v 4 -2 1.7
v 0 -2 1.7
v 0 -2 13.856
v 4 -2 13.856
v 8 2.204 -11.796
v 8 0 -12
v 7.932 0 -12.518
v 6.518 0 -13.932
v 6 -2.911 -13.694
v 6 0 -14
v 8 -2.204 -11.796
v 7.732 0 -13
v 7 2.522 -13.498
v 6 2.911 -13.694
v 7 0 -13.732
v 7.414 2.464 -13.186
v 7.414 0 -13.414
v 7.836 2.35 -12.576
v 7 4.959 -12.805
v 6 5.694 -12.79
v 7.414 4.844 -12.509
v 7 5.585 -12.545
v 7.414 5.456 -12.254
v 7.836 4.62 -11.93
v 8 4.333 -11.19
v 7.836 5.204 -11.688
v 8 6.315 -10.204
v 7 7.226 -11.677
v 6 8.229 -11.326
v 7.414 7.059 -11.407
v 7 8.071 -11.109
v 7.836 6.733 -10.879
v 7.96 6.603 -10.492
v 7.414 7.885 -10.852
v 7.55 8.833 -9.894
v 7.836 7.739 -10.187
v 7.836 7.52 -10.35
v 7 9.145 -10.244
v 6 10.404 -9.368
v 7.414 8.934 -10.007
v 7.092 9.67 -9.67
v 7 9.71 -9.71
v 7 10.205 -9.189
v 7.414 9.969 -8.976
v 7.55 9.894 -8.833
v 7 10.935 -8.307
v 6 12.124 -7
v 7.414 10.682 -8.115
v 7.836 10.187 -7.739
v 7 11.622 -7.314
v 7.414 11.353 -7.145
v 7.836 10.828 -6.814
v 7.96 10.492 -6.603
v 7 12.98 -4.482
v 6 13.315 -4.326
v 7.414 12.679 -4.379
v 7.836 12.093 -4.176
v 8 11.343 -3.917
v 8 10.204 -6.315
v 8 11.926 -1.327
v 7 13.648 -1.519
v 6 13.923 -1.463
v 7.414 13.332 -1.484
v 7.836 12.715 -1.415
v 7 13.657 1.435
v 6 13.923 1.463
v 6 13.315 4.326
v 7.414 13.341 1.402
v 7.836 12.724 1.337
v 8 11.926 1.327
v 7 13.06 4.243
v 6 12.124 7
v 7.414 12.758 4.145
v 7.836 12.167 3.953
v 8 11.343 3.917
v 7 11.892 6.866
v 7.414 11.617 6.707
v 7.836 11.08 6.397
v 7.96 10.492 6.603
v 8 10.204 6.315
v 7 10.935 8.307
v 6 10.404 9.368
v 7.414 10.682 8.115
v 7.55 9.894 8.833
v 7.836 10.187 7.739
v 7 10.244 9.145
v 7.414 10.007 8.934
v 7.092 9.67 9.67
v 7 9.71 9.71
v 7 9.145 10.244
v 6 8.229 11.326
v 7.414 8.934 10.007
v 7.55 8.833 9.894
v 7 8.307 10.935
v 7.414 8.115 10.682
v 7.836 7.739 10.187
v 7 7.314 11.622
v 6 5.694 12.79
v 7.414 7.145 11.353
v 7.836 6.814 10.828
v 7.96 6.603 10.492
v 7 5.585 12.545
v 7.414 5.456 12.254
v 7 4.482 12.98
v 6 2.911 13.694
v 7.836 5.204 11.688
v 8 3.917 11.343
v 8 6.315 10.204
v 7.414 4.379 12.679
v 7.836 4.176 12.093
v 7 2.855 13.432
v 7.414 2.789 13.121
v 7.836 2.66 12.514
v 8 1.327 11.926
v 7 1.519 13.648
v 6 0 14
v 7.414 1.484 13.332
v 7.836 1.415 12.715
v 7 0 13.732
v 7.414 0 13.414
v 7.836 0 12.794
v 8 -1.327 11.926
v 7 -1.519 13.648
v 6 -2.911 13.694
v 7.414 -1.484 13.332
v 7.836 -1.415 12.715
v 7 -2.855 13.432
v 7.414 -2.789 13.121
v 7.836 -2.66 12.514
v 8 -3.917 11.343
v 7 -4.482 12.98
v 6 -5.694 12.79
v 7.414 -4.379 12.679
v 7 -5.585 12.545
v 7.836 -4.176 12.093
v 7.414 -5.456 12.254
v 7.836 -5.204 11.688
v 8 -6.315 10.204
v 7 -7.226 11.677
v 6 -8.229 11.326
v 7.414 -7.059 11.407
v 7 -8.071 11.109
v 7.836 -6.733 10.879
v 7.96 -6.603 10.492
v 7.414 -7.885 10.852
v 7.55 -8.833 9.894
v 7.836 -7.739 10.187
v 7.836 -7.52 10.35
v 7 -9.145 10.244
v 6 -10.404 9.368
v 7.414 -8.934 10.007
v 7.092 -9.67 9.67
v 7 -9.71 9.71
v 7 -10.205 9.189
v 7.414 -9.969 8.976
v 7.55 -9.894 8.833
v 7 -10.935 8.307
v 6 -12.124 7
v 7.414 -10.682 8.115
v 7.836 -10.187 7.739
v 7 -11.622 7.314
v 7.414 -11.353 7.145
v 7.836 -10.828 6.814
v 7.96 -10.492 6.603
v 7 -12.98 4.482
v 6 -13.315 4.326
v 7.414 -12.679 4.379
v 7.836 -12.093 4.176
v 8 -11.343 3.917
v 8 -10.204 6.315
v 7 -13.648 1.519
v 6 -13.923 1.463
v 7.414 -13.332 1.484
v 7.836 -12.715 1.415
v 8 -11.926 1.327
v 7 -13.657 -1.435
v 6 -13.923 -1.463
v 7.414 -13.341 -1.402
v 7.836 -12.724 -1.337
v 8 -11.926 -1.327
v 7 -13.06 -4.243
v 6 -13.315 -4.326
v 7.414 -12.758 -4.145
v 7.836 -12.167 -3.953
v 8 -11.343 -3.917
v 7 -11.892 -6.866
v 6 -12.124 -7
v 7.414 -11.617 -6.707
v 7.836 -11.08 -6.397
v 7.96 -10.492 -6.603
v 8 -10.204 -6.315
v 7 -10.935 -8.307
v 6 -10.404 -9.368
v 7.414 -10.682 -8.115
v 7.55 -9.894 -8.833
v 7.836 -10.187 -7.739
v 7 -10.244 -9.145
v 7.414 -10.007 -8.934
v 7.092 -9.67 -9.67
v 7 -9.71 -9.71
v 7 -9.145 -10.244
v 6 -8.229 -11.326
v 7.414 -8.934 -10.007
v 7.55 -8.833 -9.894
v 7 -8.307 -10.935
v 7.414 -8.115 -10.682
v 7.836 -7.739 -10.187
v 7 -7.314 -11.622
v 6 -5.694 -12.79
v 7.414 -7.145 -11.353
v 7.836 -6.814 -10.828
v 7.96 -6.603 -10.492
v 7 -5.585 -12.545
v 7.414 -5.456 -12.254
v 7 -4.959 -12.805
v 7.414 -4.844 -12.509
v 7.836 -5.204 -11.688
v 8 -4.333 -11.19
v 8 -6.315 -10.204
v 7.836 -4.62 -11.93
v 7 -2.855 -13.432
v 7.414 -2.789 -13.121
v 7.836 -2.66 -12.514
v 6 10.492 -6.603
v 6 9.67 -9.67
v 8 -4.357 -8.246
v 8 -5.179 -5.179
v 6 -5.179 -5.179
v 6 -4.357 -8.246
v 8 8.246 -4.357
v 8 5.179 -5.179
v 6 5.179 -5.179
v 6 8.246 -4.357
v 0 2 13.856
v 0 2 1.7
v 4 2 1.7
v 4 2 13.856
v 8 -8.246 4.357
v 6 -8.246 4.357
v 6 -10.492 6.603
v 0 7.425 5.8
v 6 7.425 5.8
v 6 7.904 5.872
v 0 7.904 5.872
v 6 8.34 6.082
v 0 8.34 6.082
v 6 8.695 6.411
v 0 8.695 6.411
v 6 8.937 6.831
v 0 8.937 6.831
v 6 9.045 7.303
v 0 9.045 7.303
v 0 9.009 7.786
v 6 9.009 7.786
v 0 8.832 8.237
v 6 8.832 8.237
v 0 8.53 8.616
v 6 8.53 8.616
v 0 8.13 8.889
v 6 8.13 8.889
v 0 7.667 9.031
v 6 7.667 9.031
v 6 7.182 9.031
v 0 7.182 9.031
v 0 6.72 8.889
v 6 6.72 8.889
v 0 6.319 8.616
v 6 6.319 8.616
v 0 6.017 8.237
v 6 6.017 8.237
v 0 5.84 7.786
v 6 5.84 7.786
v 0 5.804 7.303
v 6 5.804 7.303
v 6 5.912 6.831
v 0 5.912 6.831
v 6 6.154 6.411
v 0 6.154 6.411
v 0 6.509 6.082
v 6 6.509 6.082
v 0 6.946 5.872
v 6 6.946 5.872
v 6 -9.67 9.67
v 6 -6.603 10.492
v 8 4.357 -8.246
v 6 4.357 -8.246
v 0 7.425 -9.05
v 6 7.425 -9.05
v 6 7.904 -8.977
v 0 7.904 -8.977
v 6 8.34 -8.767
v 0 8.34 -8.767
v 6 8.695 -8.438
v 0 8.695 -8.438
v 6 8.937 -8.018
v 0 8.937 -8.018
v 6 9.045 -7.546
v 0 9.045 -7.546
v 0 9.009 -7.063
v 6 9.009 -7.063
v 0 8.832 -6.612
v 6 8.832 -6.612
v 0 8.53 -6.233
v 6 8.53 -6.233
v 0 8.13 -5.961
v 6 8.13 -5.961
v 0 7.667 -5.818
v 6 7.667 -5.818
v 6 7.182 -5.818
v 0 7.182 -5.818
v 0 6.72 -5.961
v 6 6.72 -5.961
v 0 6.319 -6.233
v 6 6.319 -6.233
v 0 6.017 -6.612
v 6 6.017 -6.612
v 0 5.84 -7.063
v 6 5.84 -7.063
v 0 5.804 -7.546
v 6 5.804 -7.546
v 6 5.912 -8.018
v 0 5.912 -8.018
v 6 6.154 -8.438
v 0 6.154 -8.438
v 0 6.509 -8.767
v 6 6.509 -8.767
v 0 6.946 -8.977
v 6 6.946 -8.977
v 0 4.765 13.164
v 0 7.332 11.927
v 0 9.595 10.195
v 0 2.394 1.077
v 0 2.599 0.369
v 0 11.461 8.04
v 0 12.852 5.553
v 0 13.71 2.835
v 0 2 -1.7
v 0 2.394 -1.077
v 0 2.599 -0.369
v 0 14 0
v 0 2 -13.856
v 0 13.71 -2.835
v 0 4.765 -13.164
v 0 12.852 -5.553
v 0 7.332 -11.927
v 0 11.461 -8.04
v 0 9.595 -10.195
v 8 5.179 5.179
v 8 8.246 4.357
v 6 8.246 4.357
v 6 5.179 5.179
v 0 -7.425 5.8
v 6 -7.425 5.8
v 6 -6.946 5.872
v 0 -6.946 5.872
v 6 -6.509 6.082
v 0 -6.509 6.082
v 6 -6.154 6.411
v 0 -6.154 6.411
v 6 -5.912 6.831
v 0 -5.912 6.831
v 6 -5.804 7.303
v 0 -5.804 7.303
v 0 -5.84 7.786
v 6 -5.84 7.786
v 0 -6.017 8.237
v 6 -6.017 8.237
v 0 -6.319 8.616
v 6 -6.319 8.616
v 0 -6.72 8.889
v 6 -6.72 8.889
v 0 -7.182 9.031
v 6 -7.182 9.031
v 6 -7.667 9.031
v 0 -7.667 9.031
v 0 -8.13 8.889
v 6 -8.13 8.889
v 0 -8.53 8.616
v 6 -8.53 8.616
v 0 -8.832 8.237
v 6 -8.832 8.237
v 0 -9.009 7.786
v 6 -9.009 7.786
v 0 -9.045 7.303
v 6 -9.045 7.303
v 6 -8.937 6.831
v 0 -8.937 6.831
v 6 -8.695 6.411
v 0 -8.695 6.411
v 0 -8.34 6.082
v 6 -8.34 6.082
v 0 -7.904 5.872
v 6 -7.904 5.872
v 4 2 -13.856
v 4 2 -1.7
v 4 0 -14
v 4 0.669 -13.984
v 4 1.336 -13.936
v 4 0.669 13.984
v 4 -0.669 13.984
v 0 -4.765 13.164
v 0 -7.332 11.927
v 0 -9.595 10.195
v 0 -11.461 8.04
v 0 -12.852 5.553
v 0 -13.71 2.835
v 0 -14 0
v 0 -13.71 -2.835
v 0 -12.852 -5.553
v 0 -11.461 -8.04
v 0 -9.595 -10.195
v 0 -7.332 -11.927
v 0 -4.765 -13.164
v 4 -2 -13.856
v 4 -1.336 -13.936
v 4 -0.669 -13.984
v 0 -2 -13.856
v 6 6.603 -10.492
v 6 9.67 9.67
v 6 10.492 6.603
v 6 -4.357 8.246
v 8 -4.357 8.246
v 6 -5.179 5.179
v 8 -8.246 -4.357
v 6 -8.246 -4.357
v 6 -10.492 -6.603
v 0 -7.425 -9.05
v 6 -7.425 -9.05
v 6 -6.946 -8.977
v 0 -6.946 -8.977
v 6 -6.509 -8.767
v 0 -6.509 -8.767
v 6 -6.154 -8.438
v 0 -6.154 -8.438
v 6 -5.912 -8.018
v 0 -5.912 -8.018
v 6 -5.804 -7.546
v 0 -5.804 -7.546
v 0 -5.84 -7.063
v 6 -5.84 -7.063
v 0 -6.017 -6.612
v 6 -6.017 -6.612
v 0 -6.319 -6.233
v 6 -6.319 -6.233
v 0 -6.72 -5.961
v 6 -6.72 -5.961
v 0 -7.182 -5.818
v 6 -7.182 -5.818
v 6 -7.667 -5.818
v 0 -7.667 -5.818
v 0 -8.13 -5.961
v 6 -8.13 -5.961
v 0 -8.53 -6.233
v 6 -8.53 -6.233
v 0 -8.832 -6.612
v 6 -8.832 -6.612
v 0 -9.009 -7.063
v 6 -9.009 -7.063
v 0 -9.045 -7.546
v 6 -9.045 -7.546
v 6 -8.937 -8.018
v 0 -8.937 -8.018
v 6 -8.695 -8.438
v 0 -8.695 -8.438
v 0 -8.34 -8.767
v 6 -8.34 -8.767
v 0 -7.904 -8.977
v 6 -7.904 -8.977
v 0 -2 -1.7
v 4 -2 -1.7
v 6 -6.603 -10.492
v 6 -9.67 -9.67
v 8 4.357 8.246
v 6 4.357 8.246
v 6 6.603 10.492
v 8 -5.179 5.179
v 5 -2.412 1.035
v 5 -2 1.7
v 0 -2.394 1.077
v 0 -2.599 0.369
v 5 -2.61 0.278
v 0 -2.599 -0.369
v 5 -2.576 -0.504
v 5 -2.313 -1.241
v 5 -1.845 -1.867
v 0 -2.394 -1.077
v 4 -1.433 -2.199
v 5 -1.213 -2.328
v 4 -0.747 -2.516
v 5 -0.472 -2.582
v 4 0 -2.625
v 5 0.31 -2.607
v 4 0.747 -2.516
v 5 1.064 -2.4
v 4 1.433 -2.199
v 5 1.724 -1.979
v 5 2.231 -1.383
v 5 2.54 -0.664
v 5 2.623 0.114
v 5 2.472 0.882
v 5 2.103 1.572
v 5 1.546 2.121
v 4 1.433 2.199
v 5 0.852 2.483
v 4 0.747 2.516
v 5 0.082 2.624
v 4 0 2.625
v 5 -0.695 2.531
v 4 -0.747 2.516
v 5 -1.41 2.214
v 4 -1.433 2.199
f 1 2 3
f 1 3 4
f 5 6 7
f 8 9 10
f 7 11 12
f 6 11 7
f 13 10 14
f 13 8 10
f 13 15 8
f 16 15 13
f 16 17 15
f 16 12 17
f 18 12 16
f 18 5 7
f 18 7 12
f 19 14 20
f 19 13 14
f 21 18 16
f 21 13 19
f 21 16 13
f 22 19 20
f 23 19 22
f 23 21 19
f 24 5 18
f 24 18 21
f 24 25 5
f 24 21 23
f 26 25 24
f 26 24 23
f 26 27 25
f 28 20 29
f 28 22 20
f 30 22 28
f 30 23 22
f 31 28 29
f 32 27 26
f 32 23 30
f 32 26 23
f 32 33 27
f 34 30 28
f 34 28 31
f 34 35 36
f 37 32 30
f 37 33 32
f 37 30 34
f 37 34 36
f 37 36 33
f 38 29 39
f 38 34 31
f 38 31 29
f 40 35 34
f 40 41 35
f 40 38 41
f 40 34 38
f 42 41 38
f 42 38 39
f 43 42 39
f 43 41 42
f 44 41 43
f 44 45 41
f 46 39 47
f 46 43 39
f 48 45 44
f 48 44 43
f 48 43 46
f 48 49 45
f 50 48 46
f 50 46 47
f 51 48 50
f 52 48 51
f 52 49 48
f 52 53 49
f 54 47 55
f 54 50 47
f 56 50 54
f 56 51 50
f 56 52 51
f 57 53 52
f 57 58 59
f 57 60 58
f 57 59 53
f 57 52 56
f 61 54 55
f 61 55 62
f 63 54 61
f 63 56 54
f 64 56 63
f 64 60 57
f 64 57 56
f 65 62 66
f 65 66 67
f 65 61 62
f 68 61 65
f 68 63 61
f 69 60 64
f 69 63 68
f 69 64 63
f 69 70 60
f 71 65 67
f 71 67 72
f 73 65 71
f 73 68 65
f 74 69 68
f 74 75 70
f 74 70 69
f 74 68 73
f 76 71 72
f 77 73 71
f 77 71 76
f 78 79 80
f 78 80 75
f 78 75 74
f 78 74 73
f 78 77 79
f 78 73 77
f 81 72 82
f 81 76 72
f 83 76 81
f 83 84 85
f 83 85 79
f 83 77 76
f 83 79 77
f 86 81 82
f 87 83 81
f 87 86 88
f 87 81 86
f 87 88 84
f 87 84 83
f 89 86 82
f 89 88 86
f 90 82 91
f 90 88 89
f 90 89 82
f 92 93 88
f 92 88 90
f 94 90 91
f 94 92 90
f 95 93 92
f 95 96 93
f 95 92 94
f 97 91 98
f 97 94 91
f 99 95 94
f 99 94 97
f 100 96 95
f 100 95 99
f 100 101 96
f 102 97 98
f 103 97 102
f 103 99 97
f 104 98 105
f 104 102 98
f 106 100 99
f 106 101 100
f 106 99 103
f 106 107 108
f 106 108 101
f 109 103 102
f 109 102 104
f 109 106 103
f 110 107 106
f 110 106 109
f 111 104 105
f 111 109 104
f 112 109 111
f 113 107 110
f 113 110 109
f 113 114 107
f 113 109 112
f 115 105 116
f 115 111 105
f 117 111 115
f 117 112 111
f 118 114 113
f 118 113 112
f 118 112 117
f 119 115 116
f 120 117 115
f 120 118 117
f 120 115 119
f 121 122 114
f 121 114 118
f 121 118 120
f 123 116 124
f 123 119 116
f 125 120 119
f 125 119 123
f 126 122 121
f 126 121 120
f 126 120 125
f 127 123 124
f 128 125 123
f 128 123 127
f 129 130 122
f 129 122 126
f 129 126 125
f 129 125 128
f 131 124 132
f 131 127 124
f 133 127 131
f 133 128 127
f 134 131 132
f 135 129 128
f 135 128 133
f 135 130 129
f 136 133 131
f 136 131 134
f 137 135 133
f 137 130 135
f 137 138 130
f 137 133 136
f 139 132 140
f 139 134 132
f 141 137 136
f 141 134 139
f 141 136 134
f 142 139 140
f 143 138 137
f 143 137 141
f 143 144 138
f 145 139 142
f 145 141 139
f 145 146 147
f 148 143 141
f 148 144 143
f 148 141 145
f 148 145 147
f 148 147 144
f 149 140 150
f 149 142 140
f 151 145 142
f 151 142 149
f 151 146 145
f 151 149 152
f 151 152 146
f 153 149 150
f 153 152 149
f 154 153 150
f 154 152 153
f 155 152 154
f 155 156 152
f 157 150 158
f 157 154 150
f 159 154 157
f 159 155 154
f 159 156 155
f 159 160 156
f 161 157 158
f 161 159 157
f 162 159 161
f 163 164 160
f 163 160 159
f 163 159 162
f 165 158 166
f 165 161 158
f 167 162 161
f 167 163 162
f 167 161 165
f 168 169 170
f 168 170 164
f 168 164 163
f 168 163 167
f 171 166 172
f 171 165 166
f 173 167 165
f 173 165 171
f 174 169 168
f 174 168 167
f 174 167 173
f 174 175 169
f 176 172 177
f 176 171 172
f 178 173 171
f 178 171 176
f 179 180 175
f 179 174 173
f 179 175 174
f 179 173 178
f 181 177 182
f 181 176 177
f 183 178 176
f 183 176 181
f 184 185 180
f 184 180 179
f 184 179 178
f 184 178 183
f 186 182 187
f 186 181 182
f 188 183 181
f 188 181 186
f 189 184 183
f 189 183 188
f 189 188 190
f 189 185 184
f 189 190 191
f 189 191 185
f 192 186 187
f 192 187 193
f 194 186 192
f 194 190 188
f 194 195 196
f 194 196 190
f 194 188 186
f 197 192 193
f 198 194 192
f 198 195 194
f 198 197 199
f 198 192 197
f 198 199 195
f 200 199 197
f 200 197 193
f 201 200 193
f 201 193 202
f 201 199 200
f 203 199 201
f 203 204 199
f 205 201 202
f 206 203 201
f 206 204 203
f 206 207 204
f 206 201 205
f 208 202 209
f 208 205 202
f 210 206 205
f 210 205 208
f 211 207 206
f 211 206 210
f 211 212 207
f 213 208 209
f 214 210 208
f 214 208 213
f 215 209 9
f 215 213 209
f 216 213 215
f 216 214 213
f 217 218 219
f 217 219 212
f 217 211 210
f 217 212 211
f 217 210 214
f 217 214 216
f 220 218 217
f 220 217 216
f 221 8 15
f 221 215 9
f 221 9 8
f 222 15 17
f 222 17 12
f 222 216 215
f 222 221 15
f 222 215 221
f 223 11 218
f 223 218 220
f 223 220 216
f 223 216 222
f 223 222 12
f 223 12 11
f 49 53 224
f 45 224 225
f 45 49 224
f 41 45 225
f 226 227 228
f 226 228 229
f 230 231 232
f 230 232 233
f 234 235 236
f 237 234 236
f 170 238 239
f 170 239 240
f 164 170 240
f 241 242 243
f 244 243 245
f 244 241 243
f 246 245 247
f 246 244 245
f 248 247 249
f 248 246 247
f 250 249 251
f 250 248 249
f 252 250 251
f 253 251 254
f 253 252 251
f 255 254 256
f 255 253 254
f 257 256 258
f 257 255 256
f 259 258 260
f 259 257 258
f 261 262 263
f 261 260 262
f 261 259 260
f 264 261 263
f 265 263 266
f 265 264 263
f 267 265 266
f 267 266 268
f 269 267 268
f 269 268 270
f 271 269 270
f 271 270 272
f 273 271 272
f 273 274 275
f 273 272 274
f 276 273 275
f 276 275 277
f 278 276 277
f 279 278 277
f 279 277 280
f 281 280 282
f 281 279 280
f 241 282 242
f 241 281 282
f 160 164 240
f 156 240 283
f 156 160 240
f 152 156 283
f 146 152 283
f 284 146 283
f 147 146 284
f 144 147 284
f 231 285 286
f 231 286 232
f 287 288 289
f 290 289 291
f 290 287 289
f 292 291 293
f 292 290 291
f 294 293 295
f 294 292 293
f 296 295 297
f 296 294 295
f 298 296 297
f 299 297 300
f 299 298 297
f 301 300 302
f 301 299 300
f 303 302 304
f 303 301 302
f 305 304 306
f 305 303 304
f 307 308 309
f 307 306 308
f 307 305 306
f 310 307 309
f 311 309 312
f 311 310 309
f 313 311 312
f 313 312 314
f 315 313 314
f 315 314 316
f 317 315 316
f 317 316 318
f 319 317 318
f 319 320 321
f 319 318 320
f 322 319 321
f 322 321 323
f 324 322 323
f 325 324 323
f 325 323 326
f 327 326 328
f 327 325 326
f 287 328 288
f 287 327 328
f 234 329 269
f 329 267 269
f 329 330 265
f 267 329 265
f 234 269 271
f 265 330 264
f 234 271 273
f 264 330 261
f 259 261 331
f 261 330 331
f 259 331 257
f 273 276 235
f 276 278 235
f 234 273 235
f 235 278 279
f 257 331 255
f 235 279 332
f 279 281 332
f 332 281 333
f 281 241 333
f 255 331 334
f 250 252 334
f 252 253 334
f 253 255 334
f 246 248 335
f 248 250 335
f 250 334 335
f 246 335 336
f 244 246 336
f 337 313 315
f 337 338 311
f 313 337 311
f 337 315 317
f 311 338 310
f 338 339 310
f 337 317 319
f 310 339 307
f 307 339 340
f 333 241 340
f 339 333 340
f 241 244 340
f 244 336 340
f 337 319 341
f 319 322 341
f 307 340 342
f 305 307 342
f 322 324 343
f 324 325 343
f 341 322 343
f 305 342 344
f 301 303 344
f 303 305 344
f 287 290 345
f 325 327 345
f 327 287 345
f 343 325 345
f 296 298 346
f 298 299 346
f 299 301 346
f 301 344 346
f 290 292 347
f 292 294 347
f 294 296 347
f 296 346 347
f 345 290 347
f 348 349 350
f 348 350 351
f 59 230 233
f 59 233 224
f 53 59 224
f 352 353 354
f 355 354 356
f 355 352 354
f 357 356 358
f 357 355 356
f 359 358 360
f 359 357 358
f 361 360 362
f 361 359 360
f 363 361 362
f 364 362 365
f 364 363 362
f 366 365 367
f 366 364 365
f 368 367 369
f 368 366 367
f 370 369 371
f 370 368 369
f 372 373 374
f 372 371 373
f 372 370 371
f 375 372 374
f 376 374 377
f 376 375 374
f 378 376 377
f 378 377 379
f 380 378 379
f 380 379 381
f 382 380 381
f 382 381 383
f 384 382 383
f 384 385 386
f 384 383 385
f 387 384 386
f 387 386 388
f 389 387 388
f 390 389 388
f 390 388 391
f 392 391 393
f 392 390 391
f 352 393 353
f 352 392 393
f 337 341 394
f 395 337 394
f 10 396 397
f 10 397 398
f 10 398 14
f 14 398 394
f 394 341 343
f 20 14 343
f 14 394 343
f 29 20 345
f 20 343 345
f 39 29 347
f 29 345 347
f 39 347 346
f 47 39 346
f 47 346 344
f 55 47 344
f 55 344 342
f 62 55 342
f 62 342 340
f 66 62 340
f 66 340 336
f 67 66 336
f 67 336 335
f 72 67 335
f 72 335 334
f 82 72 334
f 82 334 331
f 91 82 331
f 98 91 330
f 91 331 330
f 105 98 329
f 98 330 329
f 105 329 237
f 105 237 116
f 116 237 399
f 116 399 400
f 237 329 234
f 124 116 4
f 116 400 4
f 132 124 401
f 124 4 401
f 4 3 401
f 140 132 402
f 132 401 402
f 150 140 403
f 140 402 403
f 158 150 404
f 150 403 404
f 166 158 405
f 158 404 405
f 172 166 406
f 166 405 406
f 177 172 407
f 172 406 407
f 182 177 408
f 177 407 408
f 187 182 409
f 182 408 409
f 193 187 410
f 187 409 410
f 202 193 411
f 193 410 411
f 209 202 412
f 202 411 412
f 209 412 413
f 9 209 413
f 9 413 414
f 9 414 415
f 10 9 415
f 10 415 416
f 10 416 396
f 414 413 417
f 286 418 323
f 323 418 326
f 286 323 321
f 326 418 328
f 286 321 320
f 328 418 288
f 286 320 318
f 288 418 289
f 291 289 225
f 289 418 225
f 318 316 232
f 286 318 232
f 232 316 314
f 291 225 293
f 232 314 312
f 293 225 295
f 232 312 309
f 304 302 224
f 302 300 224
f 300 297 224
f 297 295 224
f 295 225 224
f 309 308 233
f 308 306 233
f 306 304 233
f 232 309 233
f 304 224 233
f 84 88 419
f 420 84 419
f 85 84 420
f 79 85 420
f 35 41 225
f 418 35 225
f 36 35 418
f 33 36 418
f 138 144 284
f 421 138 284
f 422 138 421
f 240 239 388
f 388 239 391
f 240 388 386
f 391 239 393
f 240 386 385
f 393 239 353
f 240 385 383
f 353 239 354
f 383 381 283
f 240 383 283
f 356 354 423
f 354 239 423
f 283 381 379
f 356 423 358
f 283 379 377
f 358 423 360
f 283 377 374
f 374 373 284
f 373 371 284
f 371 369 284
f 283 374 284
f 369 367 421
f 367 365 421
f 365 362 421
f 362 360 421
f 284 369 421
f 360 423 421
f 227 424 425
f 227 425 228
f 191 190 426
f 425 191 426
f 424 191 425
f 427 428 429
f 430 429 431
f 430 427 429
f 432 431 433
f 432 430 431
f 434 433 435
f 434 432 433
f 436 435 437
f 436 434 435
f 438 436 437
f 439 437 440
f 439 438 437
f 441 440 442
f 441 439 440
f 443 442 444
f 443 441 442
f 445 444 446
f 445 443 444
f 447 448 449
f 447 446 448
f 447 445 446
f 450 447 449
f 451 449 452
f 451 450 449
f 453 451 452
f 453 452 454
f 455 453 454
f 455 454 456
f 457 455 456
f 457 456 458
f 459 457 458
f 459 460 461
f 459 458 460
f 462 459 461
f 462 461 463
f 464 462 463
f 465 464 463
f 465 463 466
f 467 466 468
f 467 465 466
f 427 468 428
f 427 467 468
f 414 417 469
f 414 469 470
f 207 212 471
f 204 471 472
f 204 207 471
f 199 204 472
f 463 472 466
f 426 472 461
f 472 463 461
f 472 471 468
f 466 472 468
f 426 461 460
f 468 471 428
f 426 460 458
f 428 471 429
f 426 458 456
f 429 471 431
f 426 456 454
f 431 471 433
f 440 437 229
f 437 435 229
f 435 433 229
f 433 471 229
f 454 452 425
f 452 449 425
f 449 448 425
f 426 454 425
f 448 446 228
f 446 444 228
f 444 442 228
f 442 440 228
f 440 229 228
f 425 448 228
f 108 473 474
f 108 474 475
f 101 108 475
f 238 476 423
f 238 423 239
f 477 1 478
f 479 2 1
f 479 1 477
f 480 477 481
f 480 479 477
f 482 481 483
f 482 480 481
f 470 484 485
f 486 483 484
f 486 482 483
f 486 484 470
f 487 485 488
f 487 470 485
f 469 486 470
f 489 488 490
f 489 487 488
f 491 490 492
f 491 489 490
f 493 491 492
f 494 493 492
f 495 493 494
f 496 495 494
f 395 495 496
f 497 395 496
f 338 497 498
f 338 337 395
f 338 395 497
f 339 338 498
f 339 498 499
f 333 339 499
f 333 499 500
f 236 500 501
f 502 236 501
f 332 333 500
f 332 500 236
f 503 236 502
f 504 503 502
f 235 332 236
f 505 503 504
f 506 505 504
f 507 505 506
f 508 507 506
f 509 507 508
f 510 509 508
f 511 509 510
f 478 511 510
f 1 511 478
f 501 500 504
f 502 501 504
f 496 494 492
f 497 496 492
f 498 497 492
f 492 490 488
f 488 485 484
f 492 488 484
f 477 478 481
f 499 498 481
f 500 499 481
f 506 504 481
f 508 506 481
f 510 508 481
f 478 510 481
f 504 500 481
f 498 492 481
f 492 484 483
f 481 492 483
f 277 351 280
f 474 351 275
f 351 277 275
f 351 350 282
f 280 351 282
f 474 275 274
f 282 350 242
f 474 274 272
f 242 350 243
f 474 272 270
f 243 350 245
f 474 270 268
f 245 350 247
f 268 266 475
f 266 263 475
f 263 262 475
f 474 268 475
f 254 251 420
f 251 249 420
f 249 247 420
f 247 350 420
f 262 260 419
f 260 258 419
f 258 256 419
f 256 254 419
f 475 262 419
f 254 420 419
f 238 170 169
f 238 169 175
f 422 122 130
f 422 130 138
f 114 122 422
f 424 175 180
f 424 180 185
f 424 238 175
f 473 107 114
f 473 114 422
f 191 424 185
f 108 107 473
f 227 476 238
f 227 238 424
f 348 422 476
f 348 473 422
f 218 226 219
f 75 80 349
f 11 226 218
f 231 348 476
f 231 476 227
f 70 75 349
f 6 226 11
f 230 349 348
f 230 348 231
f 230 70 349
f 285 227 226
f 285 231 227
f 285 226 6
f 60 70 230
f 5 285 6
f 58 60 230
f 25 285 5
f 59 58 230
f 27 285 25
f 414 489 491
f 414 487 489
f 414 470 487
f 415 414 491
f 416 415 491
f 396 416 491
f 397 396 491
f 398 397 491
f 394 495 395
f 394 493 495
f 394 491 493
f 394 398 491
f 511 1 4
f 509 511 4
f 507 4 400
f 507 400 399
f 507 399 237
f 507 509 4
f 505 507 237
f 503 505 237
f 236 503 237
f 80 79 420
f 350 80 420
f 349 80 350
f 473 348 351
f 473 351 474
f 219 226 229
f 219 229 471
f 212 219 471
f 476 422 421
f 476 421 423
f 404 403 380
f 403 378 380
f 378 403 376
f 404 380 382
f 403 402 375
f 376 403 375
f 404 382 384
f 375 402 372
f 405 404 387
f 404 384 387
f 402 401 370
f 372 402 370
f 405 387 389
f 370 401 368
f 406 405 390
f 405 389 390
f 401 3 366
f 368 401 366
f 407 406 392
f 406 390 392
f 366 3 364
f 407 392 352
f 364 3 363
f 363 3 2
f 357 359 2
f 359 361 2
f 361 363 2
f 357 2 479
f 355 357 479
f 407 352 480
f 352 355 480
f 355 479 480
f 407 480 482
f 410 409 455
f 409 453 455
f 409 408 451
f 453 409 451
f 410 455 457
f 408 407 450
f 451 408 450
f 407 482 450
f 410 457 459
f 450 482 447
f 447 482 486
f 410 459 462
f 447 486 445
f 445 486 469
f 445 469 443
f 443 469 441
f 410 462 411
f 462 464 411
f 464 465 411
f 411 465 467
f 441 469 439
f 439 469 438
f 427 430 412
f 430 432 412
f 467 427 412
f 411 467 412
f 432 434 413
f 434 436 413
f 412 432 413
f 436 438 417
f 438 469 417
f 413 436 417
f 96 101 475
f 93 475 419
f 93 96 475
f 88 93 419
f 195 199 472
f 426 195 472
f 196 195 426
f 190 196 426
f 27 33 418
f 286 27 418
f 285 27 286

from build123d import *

# Parameters (mm, degrees)
SKETCH4_R               = 14
SKETCH4_R_2             = 1.625
CIRCULAR_FOOT_DEPTH     = 8
FILLET1_R               = 2
CUT_EXTRUDE1_DEPTH      = 2
CUT_EXTRUDE2_DEPTH      = 22.354156673
CUT_EXTRUDE2_DEPTH_BACK = 22.354156673
SKETCH14_W              = 4
SKETCH14_H              = 4
SKETCH16_R              = 2.625
CUT_EXTRUDE3_DEPTH      = 5


with BuildPart() as part:
    # Sketch4 → Circular Foot (new body)
    with BuildSketch(Plane(origin=(0, 0, 0), x_dir=(0, 0, -1), z_dir=(1, 0, 0))):
        Circle(SKETCH4_R)
        with Locations((-7.424621202, -7.424621202)):
            Circle(SKETCH4_R_2, mode=Mode.SUBTRACT)
        with Locations((7.424621202, -7.424621202)):
            Circle(SKETCH4_R_2, mode=Mode.SUBTRACT)
        with Locations((7.424621202, 7.424621202)):
            Circle(SKETCH4_R_2, mode=Mode.SUBTRACT)
        with Locations((-7.424621202, 7.424621202)):
            Circle(SKETCH4_R_2, mode=Mode.SUBTRACT)
    extrude(amount=CIRCULAR_FOOT_DEPTH)

    # Fillet1
    # the kernel refuses this fillet: 2 mm, written as the material it takes off along each edge
    with BuildSketch(Plane(origin=(8, 0, 0), x_dir=(0, 0, -1), z_dir=(0, -1, 0))) as fillet1_piece_1:
        with BuildLine():
            CenterArc((14 - FILLET1_R, -FILLET1_R), FILLET1_R, 0, 90)
            Line((14 - FILLET1_R, 0), (14, 0))
            Line((14, 0), (14, -FILLET1_R))
        make_face()
    revolve(axis=Axis((8, 0, 0), (1, 0, 0)), mode=Mode.SUBTRACT)

    # Sketch7 → Cut-Extrude1 (cut)
    with BuildSketch(Plane.ZY.offset(-8)):
        Polygon((-5.179255605, -5.179255605), (-8.246482052, -4.357394755), (-10.491847649, -6.602760353), (-9.6699868, -9.6699868), (-6.602760353, -10.491847649), (-4.357394755, -8.246482052), align=None)
        Polygon((6.602760353, -10.491847649), (9.6699868, -9.6699868), (10.491847649, -6.602760353), (8.246482052, -4.357394755), (5.179255605, -5.179255605), (4.357394755, -8.246482052), align=None)
        Polygon((6.602760353, 10.491847649), (4.357394755, 8.246482052), (5.179255605, 5.179255605), (8.246482052, 4.357394755), (10.491847649, 6.602760353), (9.6699868, 9.6699868), align=None)
        Polygon((-4.357394755, 8.246482052), (-6.602760353, 10.491847649), (-9.6699868, 9.6699868), (-10.491847649, 6.602760353), (-8.246482052, 4.357394755), (-5.179255605, 5.179255605), align=None)
    extrude(amount=CUT_EXTRUDE1_DEPTH, mode=Mode.SUBTRACT)

    # Sketch14 → Cut-Extrude2 (cut, two sides: drawn at the far end of the back side and taken through both)
    with BuildSketch(Plane.XY.offset(-CUT_EXTRUDE2_DEPTH_BACK)):
        with Locations((2, 0)):
            Rectangle(SKETCH14_W, SKETCH14_H)
    extrude(amount=CUT_EXTRUDE2_DEPTH + CUT_EXTRUDE2_DEPTH_BACK, mode=Mode.SUBTRACT)

    # Sketch16 → Cut-Extrude3 (cut)
    with BuildSketch(Plane(origin=(0, 0, 0), x_dir=(0, 0, -1), z_dir=(1, 0, 0))):
        with Locations(Location((0, 0, 0), (0, 0, 229.632406456))):
            Circle(SKETCH16_R)
    extrude(amount=CUT_EXTRUDE3_DEPTH, mode=Mode.SUBTRACT)


solid = part.part
